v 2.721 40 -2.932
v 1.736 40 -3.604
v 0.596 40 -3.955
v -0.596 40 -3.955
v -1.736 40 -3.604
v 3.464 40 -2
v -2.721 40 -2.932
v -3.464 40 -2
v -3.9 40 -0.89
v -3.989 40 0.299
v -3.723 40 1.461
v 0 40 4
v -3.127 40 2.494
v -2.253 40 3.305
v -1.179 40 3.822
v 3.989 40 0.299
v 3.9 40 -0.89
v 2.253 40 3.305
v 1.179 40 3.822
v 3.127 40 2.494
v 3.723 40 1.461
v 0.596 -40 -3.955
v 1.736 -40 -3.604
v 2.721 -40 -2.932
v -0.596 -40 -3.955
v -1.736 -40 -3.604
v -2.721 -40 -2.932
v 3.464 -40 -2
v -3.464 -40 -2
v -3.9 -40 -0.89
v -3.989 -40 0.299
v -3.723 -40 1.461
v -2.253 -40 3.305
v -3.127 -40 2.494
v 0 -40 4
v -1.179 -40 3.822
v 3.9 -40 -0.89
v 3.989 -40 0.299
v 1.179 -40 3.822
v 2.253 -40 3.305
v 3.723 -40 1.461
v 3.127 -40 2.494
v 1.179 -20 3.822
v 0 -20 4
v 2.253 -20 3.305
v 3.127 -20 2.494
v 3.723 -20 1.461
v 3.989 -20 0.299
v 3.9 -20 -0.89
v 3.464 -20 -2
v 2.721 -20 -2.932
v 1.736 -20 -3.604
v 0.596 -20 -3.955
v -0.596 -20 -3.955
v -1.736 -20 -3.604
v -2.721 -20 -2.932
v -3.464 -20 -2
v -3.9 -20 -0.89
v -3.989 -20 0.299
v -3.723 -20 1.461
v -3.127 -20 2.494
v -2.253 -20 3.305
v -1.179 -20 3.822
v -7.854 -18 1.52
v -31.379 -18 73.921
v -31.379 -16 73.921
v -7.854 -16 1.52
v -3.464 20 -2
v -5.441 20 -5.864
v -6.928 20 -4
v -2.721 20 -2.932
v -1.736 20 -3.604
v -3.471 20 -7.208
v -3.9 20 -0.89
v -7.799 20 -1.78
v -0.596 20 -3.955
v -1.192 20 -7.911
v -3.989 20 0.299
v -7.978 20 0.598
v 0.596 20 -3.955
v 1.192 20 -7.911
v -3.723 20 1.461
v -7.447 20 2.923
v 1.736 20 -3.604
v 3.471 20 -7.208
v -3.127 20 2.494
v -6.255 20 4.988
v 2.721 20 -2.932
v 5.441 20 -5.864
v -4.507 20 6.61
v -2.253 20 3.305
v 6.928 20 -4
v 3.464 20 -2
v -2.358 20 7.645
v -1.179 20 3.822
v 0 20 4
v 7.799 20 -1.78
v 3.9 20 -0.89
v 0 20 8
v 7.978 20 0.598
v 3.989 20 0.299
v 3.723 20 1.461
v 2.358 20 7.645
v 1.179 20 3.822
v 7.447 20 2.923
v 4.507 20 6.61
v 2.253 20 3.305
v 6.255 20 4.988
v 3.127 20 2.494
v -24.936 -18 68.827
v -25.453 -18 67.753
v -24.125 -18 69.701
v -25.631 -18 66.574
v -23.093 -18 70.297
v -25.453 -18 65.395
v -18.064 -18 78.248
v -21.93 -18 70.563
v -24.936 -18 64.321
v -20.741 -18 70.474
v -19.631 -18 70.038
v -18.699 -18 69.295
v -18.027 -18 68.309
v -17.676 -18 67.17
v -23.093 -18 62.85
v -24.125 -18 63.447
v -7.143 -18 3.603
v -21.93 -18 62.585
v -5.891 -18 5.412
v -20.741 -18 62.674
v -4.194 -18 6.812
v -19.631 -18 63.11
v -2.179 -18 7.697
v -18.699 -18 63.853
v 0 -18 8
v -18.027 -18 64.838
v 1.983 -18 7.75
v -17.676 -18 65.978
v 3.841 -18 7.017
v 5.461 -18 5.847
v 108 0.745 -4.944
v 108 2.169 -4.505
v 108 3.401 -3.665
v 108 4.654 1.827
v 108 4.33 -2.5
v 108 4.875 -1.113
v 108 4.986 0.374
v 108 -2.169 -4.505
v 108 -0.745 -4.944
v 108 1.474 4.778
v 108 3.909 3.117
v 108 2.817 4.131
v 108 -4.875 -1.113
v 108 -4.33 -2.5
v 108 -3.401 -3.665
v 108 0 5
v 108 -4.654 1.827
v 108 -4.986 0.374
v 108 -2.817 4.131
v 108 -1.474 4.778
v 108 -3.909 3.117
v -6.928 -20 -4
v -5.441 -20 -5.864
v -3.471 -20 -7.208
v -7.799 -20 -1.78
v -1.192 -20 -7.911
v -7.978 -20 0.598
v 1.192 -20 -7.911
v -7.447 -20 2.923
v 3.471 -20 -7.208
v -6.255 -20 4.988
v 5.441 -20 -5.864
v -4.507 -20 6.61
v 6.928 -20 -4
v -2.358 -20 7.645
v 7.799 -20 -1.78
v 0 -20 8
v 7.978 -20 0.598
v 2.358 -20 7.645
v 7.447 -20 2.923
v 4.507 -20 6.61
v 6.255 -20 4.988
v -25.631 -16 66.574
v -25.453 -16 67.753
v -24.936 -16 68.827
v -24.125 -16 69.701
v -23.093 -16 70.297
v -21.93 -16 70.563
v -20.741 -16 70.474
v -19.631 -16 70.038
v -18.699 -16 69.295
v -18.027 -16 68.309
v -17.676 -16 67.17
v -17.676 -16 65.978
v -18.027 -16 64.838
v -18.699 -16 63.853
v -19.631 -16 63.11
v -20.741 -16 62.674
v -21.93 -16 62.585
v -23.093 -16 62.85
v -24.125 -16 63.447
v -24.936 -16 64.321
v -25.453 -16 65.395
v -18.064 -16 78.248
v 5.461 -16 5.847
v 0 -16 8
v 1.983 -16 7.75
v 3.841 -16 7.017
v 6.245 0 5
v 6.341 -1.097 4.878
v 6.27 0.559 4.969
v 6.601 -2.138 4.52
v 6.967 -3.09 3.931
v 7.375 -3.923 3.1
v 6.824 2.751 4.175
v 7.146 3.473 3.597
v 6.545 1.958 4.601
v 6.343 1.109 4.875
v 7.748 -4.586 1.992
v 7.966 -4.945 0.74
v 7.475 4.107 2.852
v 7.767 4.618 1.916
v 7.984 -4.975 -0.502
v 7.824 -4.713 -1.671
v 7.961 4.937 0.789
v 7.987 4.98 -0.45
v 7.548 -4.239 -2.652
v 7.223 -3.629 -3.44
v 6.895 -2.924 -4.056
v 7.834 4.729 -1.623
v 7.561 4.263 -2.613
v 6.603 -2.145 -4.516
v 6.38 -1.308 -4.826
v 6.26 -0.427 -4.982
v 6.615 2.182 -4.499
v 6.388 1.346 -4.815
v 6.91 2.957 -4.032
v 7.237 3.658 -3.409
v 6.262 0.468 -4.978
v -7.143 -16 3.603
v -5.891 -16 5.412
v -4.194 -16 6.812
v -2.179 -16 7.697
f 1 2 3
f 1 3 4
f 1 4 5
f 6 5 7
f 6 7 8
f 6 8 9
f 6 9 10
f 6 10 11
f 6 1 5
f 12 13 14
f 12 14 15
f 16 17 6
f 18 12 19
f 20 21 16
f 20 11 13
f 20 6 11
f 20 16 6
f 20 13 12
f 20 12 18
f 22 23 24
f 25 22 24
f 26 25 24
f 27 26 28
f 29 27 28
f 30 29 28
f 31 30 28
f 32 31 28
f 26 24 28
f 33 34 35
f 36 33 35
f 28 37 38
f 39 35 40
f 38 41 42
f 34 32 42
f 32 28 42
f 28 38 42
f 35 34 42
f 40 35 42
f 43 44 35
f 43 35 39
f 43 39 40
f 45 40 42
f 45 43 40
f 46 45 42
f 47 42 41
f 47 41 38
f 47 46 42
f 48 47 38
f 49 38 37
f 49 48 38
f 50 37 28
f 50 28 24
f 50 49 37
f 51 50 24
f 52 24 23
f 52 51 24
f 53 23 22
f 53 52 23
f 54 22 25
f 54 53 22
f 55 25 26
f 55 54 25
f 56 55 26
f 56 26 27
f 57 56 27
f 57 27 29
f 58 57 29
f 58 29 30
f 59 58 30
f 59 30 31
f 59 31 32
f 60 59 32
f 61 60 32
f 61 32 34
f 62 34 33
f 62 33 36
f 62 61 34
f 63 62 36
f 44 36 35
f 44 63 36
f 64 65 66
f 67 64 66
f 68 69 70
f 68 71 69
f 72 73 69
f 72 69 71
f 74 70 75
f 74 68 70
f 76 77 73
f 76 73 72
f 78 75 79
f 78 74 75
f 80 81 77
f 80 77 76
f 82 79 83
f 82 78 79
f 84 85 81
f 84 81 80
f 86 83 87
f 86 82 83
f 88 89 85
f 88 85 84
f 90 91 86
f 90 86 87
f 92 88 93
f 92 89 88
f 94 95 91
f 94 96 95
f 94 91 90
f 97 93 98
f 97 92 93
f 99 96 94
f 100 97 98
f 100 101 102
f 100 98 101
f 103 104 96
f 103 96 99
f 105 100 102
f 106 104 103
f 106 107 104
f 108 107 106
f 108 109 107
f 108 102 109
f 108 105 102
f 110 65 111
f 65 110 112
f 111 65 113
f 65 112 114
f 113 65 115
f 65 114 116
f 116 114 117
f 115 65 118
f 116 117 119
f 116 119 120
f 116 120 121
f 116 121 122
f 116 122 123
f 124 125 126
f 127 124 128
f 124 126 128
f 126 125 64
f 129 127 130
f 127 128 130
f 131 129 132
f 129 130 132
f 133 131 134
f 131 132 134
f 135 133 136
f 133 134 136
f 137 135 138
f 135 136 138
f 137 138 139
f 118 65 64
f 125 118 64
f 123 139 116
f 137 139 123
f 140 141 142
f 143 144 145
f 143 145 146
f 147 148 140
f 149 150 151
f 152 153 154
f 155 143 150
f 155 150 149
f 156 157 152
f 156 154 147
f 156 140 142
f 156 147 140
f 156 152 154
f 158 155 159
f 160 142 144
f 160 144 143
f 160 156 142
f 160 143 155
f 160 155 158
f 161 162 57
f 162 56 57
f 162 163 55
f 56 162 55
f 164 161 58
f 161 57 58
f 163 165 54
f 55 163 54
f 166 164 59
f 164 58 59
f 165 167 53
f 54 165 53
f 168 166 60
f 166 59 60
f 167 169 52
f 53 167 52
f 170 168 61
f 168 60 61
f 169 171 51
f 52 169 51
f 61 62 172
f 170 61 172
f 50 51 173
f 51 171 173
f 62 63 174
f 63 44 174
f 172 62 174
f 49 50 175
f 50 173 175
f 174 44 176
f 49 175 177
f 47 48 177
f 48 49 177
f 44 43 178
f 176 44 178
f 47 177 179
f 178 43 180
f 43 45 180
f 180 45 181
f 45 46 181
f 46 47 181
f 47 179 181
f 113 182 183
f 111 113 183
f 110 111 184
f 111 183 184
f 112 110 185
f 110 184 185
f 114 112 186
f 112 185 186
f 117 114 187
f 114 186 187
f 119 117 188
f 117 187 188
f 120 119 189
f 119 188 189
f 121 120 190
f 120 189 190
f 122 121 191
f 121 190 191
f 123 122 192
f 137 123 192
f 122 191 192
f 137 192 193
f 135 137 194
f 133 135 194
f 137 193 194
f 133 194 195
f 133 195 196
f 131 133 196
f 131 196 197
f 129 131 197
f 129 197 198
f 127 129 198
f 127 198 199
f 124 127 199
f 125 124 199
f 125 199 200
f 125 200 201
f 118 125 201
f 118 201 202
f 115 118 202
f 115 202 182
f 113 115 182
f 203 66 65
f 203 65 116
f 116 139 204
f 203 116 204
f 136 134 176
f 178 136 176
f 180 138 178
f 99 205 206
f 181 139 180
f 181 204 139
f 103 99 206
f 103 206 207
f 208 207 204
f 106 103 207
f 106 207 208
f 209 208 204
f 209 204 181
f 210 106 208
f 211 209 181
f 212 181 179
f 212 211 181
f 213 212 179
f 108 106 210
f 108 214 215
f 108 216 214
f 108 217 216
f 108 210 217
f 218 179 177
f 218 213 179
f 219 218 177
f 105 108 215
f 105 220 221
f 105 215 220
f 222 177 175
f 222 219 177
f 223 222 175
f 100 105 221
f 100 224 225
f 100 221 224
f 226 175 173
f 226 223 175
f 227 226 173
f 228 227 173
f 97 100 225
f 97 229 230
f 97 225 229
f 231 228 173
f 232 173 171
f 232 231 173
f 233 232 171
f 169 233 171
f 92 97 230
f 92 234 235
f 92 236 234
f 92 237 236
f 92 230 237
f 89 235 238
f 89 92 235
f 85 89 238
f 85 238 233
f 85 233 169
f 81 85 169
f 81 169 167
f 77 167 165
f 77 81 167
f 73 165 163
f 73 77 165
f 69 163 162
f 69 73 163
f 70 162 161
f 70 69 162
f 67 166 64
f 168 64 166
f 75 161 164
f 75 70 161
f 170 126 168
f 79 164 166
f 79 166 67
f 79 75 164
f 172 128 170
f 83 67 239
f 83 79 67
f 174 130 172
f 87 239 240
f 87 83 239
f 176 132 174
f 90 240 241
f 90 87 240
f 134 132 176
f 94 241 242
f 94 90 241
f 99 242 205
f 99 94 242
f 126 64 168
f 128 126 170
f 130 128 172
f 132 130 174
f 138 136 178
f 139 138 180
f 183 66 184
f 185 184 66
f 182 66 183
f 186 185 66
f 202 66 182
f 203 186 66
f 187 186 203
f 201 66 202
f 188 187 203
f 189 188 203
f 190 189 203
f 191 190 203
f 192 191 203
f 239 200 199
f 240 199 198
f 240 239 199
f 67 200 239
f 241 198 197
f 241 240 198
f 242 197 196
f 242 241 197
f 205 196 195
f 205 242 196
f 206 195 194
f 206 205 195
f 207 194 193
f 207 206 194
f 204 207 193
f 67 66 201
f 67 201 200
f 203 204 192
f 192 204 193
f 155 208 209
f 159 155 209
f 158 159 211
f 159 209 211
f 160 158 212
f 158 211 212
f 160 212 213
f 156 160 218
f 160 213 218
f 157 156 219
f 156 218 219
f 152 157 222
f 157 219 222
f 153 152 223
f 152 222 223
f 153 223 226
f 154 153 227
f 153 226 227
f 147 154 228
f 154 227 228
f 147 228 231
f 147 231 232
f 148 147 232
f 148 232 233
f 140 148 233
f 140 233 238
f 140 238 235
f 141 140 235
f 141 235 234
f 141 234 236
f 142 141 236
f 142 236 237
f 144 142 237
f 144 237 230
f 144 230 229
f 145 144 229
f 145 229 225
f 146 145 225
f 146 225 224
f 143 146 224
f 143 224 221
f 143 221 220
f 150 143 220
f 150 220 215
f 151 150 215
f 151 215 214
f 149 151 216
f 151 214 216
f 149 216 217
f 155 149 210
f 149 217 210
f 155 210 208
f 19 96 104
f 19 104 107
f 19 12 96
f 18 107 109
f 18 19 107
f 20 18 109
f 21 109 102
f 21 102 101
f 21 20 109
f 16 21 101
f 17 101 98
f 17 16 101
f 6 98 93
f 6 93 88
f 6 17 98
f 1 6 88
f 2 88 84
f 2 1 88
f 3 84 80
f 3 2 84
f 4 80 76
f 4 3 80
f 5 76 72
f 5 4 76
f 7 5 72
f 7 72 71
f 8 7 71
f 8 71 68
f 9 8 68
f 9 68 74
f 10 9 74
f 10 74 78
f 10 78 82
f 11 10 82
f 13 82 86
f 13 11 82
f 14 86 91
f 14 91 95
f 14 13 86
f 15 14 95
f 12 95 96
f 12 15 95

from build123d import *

# Parameters (mm, degrees)
SKETCH1_R           = 4
BOSS_EXTRUDE1_DEPTH = 40
SKETCH3_R           = 8
BOSS_EXTRUDE2_DEPTH = 20
SKETCH4_R           = 5
BOSS_EXTRUDE3_DEPTH = 108
SKETCH5_W           = 14
SKETCH5_H           = 2
BOSS_EXTRUDE4_DEPTH = 80
CUT_EXTRUDE1_REACH  = 146.647
SKETCH6_R           = 4


with BuildPart() as part:
    # Sketch1 → Boss-Extrude1 (new, symmetric)
    with BuildSketch(Plane(origin=(0, 0, 0), x_dir=(1, 0, 0), z_dir=(0, 1, 0))):
        Circle(SKETCH1_R)
    extrude(amount=BOSS_EXTRUDE1_DEPTH, both=True)

    # Sketch3 → Boss-Extrude2 (add, symmetric)
    with BuildSketch(Plane(origin=(0, 0, 0), x_dir=(1, 0, 0), z_dir=(0, 1, 0))):
        Circle(SKETCH3_R)
    extrude(amount=BOSS_EXTRUDE2_DEPTH, both=True)

    # Sketch4 → Boss-Extrude3 (add)
    with BuildSketch(Plane(origin=(0, 0, 0), x_dir=(0, 0, -1), z_dir=(1, 0, 0))):
        Circle(SKETCH4_R)
    extrude(amount=BOSS_EXTRUDE3_DEPTH)

    # Sketch5 → Boss-Extrude4 (add)
    with BuildSketch(Plane(origin=(0, 0, 0), x_dir=(0.9510565162951534, 0, 0.3090169943749482), z_dir=(-0.3090169943749482, 0, 0.9510565162951534))):
        with Locations((0, -17)):
            Rectangle(SKETCH5_W, SKETCH5_H)
    extrude(amount=BOSS_EXTRUDE4_DEPTH)

    # Sketch6 → Cut-Extrude1 (cut, up to next)
    with BuildSketch(Plane(origin=(0, -16, 0), x_dir=(1, 0, 0), z_dir=(0, 1, 0)), mode=Mode.PRIVATE) as cut_extrude1_sk1:
        with Locations((-21.631189606, -66.573956141)):
            Circle(SKETCH6_R)
    cut_extrude1_tool1 = extrude(cut_extrude1_sk1.sketch, amount=-CUT_EXTRUDE1_REACH, mode=Mode.PRIVATE) & part.part
    add(cut_extrude1_tool1.solids().sort_by_distance((-21.63119, -16, 66.573956))[0], mode=Mode.SUBTRACT)


solid = part.part
